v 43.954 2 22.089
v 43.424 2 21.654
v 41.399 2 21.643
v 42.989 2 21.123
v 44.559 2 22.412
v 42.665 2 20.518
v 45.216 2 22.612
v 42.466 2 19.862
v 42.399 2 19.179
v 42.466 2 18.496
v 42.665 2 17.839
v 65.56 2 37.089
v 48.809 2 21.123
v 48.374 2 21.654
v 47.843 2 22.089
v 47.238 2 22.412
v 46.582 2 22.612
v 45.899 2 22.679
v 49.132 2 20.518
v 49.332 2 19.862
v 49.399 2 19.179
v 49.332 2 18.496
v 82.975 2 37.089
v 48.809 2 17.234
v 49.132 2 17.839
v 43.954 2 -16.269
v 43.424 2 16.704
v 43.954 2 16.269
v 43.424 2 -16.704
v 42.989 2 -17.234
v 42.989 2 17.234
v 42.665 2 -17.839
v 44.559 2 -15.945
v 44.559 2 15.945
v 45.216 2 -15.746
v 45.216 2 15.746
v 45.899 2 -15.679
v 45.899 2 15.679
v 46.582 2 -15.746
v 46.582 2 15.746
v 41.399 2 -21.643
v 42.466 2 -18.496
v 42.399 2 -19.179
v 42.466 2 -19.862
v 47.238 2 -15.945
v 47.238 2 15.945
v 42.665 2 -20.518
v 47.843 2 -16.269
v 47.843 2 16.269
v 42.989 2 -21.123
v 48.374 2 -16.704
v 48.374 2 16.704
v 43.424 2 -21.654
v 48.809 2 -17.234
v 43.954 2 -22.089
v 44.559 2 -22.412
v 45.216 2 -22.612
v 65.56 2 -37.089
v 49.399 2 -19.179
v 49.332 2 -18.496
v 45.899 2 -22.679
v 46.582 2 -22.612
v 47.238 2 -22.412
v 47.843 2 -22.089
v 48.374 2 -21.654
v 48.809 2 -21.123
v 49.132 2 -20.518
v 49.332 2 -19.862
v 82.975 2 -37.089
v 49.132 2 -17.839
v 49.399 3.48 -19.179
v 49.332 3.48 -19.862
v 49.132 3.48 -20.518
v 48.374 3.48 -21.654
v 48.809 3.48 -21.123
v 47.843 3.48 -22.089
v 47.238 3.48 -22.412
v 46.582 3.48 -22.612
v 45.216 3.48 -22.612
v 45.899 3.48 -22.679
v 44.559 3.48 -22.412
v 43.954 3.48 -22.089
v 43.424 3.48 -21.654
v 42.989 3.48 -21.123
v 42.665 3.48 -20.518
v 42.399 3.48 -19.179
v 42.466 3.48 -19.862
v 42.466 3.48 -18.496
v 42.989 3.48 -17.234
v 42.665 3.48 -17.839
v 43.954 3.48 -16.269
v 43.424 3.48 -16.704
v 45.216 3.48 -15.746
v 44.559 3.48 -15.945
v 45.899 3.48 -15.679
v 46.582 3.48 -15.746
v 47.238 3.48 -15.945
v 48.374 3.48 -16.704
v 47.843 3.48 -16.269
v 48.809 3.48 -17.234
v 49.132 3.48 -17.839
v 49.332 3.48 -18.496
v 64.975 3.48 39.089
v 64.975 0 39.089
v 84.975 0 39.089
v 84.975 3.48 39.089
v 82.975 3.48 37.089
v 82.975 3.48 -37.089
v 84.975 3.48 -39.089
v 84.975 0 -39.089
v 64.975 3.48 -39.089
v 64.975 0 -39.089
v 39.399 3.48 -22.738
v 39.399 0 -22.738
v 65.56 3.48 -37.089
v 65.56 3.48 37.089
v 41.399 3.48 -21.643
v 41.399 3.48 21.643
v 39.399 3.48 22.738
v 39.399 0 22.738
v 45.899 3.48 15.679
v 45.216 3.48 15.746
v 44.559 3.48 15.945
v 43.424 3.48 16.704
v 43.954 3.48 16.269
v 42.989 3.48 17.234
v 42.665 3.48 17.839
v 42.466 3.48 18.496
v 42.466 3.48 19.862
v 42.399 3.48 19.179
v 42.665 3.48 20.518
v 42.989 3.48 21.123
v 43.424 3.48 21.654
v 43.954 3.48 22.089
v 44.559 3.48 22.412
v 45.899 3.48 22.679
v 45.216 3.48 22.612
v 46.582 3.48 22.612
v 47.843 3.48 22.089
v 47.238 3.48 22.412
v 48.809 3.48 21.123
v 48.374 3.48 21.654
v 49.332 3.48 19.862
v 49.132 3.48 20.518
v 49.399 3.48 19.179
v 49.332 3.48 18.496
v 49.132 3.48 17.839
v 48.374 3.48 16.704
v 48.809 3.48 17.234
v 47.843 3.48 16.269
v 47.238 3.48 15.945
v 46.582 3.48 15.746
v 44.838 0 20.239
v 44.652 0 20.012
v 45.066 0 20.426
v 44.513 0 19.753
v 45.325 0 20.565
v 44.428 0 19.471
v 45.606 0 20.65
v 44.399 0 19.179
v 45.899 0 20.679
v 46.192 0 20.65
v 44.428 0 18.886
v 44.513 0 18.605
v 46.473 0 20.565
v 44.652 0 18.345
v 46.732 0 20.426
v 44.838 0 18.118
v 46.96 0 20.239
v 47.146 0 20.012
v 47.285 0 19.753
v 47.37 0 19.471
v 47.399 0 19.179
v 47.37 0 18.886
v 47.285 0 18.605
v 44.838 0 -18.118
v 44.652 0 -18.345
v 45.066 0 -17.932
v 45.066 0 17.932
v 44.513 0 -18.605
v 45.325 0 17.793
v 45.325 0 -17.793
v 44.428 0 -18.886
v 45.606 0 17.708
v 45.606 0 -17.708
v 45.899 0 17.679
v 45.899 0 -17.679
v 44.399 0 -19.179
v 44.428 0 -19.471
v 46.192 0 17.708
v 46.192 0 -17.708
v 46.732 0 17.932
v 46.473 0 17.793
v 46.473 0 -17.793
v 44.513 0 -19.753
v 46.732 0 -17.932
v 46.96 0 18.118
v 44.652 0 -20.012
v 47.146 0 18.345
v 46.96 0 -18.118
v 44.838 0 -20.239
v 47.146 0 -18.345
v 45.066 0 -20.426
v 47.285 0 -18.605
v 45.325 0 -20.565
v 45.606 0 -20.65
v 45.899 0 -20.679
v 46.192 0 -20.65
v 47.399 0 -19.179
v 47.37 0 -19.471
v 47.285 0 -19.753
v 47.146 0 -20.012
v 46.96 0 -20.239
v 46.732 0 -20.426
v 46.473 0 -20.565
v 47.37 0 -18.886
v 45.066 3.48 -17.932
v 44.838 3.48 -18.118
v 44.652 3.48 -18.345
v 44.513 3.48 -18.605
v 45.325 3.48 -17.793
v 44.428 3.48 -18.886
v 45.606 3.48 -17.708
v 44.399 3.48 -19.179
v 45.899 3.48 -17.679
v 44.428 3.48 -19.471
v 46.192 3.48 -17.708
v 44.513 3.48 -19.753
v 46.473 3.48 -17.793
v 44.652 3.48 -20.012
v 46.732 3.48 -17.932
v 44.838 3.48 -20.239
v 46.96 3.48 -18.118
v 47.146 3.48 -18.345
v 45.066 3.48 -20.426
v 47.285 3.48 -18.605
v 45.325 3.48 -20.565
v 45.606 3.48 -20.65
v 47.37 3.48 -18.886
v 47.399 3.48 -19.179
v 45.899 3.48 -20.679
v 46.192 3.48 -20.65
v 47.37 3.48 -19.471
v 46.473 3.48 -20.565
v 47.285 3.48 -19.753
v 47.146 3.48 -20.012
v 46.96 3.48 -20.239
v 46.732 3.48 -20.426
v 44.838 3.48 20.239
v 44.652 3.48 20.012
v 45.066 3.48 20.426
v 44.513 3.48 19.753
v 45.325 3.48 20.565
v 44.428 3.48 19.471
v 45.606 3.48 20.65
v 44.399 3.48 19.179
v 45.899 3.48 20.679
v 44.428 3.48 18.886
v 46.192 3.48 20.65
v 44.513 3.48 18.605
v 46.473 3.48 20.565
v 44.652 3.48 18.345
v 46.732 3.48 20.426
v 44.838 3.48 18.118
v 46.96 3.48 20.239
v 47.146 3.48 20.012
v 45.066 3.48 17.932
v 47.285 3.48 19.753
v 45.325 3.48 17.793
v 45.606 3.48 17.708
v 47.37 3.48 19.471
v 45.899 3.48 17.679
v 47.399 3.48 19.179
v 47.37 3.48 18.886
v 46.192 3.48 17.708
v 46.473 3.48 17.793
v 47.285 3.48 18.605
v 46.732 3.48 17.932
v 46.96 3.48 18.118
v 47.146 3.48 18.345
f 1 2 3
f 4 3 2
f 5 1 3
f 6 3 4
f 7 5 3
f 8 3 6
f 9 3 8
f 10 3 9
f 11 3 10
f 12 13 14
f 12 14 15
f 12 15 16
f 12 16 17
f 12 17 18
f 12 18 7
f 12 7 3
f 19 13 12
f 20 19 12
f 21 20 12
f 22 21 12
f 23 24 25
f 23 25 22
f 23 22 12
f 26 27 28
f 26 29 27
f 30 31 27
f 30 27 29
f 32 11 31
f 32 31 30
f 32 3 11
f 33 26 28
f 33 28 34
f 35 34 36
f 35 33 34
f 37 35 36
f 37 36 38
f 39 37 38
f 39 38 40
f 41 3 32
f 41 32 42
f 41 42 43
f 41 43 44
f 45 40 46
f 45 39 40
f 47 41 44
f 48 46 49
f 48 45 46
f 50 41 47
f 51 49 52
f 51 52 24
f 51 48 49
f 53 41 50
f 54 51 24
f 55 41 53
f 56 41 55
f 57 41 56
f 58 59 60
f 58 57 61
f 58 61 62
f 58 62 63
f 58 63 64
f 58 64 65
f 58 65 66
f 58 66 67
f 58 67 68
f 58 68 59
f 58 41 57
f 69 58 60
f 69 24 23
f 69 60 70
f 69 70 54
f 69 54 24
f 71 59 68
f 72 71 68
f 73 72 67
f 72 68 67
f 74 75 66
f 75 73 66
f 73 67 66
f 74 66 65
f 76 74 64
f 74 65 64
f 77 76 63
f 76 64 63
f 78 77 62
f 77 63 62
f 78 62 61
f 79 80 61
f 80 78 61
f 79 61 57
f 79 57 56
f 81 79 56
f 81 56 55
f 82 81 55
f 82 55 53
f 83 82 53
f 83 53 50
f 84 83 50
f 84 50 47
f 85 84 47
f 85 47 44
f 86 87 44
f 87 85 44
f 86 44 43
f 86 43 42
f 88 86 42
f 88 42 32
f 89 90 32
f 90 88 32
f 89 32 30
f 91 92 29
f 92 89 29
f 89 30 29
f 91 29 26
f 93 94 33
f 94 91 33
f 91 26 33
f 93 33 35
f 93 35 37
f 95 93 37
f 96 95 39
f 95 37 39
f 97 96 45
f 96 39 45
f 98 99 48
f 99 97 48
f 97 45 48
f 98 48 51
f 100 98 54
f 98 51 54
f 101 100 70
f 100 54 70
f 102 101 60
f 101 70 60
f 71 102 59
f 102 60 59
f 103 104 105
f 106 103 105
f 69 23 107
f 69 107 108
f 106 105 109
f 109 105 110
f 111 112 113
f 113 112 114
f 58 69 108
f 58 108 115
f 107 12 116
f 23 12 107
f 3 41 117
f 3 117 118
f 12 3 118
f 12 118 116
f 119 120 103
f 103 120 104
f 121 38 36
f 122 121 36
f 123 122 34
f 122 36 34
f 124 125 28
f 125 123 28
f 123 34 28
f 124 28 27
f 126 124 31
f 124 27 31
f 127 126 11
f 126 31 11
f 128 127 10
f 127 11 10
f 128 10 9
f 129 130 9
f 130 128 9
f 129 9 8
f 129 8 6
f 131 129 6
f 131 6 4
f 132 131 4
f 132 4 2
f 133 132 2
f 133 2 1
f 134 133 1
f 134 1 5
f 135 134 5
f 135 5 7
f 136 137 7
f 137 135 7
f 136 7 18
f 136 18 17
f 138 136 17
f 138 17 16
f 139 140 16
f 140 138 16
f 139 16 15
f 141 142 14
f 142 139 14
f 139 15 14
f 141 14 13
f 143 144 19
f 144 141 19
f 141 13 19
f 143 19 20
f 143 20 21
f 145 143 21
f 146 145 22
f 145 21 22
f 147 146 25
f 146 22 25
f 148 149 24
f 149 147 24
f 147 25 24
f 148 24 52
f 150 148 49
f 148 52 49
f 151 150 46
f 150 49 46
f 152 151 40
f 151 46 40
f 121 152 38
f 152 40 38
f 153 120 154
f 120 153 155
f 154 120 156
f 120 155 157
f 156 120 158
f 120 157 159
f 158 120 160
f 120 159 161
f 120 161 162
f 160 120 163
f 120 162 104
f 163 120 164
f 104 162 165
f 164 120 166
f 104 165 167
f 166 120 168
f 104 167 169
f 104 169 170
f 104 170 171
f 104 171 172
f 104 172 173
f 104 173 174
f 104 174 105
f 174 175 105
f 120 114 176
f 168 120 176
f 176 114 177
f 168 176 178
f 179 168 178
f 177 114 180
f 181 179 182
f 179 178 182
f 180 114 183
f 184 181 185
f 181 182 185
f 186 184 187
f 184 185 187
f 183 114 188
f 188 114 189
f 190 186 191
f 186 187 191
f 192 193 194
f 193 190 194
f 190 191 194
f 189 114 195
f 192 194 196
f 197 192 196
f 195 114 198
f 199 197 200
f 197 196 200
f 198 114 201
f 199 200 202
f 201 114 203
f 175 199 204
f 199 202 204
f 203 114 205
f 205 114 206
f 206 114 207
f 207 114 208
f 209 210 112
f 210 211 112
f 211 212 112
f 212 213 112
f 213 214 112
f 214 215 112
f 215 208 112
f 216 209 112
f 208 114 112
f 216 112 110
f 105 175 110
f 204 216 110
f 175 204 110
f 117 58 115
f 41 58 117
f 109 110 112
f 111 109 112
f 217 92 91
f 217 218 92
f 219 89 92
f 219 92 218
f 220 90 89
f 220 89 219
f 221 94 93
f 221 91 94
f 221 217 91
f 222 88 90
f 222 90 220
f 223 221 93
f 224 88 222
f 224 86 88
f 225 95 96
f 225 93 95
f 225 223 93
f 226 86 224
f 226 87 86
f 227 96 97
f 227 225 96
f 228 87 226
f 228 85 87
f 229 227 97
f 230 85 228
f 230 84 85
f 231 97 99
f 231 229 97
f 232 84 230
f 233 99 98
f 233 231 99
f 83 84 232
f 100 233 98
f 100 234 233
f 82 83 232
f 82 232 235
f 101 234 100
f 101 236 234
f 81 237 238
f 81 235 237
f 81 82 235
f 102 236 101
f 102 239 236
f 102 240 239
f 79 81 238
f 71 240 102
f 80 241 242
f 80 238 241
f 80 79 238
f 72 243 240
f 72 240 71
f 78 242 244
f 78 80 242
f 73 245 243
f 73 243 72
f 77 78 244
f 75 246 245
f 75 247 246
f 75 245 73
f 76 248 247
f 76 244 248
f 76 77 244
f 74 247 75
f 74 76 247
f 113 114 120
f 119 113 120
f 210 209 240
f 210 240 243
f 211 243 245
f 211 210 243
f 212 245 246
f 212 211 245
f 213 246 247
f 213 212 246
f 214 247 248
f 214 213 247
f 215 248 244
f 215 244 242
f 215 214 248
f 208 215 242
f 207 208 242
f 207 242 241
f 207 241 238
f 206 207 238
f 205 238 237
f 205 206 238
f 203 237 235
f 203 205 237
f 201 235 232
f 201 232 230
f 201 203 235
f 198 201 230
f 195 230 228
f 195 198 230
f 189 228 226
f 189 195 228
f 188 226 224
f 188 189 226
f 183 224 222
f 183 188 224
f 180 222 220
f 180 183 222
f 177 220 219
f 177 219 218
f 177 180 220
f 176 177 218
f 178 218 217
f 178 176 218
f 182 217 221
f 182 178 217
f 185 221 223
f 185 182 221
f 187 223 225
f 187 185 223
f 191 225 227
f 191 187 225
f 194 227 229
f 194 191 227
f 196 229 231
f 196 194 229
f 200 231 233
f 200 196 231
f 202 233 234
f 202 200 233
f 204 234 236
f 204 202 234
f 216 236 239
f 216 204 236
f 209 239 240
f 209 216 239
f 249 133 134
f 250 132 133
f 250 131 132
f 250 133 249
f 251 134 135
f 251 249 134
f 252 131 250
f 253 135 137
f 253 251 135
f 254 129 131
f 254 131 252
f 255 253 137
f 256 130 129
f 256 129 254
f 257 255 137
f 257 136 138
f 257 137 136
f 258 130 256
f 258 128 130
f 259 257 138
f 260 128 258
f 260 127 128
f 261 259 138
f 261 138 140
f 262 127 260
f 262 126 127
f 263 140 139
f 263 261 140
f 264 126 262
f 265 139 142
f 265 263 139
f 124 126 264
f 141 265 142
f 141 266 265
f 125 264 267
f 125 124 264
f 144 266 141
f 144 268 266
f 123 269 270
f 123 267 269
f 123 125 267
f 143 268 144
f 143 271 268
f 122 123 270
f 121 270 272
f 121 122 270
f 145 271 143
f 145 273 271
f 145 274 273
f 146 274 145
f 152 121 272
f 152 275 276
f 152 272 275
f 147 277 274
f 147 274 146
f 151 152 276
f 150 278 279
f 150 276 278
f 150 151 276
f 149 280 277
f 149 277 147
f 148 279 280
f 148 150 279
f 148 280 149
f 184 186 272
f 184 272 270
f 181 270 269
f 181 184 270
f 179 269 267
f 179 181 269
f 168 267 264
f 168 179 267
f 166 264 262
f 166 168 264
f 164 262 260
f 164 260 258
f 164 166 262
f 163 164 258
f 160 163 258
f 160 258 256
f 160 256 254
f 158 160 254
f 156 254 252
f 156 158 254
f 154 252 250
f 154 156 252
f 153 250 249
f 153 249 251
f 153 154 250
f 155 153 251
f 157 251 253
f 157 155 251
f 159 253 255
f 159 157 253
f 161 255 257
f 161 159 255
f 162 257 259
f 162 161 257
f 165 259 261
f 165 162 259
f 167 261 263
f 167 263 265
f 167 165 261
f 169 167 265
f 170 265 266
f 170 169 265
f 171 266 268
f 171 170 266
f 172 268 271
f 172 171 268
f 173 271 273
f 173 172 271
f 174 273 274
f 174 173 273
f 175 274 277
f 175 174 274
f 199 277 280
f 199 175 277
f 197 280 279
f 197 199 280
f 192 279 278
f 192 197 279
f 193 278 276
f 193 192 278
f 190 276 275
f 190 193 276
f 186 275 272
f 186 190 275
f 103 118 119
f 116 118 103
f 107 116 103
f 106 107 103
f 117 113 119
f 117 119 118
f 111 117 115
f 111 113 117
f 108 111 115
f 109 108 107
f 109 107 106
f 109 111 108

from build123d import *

# Parameters (mm, degrees)
SKETCH1_R           = 1.5
BOSS_EXTRUDE1_DEPTH = 3.48
SHELL1_T            = -2


with BuildPart() as part:
    # Sketch1 → Boss-Extrude1 (new body)
    with BuildSketch(Plane(origin=(0, 0, 0), x_dir=(1, 0, 0), z_dir=(0, 1, 0))):
        Polygon((84.974878237, 39.0892), (64.974878237, 39.0892), (39.398878237, 22.738080915), (39.398878237, -22.738080915), (64.974878237, -39.0892), (84.974878237, -39.0892), align=None)
        with Locations((45.898878237, 19.1788)):
            Circle(SKETCH1_R, mode=Mode.SUBTRACT)
        with Locations(Location((45.898878237, -19.1788, 0), (0, 0, 90))):
            Circle(SKETCH1_R, mode=Mode.SUBTRACT)
    extrude(amount=BOSS_EXTRUDE1_DEPTH)

    # Shell1
    shell1_openings = [part.faces().sort_by_distance(p)[0] for p in [
        (64.165608006, 3.48, 0),
    ]]
    offset(amount=SHELL1_T, openings=shell1_openings, kind=Kind.INTERSECTION)


solid = part.part
